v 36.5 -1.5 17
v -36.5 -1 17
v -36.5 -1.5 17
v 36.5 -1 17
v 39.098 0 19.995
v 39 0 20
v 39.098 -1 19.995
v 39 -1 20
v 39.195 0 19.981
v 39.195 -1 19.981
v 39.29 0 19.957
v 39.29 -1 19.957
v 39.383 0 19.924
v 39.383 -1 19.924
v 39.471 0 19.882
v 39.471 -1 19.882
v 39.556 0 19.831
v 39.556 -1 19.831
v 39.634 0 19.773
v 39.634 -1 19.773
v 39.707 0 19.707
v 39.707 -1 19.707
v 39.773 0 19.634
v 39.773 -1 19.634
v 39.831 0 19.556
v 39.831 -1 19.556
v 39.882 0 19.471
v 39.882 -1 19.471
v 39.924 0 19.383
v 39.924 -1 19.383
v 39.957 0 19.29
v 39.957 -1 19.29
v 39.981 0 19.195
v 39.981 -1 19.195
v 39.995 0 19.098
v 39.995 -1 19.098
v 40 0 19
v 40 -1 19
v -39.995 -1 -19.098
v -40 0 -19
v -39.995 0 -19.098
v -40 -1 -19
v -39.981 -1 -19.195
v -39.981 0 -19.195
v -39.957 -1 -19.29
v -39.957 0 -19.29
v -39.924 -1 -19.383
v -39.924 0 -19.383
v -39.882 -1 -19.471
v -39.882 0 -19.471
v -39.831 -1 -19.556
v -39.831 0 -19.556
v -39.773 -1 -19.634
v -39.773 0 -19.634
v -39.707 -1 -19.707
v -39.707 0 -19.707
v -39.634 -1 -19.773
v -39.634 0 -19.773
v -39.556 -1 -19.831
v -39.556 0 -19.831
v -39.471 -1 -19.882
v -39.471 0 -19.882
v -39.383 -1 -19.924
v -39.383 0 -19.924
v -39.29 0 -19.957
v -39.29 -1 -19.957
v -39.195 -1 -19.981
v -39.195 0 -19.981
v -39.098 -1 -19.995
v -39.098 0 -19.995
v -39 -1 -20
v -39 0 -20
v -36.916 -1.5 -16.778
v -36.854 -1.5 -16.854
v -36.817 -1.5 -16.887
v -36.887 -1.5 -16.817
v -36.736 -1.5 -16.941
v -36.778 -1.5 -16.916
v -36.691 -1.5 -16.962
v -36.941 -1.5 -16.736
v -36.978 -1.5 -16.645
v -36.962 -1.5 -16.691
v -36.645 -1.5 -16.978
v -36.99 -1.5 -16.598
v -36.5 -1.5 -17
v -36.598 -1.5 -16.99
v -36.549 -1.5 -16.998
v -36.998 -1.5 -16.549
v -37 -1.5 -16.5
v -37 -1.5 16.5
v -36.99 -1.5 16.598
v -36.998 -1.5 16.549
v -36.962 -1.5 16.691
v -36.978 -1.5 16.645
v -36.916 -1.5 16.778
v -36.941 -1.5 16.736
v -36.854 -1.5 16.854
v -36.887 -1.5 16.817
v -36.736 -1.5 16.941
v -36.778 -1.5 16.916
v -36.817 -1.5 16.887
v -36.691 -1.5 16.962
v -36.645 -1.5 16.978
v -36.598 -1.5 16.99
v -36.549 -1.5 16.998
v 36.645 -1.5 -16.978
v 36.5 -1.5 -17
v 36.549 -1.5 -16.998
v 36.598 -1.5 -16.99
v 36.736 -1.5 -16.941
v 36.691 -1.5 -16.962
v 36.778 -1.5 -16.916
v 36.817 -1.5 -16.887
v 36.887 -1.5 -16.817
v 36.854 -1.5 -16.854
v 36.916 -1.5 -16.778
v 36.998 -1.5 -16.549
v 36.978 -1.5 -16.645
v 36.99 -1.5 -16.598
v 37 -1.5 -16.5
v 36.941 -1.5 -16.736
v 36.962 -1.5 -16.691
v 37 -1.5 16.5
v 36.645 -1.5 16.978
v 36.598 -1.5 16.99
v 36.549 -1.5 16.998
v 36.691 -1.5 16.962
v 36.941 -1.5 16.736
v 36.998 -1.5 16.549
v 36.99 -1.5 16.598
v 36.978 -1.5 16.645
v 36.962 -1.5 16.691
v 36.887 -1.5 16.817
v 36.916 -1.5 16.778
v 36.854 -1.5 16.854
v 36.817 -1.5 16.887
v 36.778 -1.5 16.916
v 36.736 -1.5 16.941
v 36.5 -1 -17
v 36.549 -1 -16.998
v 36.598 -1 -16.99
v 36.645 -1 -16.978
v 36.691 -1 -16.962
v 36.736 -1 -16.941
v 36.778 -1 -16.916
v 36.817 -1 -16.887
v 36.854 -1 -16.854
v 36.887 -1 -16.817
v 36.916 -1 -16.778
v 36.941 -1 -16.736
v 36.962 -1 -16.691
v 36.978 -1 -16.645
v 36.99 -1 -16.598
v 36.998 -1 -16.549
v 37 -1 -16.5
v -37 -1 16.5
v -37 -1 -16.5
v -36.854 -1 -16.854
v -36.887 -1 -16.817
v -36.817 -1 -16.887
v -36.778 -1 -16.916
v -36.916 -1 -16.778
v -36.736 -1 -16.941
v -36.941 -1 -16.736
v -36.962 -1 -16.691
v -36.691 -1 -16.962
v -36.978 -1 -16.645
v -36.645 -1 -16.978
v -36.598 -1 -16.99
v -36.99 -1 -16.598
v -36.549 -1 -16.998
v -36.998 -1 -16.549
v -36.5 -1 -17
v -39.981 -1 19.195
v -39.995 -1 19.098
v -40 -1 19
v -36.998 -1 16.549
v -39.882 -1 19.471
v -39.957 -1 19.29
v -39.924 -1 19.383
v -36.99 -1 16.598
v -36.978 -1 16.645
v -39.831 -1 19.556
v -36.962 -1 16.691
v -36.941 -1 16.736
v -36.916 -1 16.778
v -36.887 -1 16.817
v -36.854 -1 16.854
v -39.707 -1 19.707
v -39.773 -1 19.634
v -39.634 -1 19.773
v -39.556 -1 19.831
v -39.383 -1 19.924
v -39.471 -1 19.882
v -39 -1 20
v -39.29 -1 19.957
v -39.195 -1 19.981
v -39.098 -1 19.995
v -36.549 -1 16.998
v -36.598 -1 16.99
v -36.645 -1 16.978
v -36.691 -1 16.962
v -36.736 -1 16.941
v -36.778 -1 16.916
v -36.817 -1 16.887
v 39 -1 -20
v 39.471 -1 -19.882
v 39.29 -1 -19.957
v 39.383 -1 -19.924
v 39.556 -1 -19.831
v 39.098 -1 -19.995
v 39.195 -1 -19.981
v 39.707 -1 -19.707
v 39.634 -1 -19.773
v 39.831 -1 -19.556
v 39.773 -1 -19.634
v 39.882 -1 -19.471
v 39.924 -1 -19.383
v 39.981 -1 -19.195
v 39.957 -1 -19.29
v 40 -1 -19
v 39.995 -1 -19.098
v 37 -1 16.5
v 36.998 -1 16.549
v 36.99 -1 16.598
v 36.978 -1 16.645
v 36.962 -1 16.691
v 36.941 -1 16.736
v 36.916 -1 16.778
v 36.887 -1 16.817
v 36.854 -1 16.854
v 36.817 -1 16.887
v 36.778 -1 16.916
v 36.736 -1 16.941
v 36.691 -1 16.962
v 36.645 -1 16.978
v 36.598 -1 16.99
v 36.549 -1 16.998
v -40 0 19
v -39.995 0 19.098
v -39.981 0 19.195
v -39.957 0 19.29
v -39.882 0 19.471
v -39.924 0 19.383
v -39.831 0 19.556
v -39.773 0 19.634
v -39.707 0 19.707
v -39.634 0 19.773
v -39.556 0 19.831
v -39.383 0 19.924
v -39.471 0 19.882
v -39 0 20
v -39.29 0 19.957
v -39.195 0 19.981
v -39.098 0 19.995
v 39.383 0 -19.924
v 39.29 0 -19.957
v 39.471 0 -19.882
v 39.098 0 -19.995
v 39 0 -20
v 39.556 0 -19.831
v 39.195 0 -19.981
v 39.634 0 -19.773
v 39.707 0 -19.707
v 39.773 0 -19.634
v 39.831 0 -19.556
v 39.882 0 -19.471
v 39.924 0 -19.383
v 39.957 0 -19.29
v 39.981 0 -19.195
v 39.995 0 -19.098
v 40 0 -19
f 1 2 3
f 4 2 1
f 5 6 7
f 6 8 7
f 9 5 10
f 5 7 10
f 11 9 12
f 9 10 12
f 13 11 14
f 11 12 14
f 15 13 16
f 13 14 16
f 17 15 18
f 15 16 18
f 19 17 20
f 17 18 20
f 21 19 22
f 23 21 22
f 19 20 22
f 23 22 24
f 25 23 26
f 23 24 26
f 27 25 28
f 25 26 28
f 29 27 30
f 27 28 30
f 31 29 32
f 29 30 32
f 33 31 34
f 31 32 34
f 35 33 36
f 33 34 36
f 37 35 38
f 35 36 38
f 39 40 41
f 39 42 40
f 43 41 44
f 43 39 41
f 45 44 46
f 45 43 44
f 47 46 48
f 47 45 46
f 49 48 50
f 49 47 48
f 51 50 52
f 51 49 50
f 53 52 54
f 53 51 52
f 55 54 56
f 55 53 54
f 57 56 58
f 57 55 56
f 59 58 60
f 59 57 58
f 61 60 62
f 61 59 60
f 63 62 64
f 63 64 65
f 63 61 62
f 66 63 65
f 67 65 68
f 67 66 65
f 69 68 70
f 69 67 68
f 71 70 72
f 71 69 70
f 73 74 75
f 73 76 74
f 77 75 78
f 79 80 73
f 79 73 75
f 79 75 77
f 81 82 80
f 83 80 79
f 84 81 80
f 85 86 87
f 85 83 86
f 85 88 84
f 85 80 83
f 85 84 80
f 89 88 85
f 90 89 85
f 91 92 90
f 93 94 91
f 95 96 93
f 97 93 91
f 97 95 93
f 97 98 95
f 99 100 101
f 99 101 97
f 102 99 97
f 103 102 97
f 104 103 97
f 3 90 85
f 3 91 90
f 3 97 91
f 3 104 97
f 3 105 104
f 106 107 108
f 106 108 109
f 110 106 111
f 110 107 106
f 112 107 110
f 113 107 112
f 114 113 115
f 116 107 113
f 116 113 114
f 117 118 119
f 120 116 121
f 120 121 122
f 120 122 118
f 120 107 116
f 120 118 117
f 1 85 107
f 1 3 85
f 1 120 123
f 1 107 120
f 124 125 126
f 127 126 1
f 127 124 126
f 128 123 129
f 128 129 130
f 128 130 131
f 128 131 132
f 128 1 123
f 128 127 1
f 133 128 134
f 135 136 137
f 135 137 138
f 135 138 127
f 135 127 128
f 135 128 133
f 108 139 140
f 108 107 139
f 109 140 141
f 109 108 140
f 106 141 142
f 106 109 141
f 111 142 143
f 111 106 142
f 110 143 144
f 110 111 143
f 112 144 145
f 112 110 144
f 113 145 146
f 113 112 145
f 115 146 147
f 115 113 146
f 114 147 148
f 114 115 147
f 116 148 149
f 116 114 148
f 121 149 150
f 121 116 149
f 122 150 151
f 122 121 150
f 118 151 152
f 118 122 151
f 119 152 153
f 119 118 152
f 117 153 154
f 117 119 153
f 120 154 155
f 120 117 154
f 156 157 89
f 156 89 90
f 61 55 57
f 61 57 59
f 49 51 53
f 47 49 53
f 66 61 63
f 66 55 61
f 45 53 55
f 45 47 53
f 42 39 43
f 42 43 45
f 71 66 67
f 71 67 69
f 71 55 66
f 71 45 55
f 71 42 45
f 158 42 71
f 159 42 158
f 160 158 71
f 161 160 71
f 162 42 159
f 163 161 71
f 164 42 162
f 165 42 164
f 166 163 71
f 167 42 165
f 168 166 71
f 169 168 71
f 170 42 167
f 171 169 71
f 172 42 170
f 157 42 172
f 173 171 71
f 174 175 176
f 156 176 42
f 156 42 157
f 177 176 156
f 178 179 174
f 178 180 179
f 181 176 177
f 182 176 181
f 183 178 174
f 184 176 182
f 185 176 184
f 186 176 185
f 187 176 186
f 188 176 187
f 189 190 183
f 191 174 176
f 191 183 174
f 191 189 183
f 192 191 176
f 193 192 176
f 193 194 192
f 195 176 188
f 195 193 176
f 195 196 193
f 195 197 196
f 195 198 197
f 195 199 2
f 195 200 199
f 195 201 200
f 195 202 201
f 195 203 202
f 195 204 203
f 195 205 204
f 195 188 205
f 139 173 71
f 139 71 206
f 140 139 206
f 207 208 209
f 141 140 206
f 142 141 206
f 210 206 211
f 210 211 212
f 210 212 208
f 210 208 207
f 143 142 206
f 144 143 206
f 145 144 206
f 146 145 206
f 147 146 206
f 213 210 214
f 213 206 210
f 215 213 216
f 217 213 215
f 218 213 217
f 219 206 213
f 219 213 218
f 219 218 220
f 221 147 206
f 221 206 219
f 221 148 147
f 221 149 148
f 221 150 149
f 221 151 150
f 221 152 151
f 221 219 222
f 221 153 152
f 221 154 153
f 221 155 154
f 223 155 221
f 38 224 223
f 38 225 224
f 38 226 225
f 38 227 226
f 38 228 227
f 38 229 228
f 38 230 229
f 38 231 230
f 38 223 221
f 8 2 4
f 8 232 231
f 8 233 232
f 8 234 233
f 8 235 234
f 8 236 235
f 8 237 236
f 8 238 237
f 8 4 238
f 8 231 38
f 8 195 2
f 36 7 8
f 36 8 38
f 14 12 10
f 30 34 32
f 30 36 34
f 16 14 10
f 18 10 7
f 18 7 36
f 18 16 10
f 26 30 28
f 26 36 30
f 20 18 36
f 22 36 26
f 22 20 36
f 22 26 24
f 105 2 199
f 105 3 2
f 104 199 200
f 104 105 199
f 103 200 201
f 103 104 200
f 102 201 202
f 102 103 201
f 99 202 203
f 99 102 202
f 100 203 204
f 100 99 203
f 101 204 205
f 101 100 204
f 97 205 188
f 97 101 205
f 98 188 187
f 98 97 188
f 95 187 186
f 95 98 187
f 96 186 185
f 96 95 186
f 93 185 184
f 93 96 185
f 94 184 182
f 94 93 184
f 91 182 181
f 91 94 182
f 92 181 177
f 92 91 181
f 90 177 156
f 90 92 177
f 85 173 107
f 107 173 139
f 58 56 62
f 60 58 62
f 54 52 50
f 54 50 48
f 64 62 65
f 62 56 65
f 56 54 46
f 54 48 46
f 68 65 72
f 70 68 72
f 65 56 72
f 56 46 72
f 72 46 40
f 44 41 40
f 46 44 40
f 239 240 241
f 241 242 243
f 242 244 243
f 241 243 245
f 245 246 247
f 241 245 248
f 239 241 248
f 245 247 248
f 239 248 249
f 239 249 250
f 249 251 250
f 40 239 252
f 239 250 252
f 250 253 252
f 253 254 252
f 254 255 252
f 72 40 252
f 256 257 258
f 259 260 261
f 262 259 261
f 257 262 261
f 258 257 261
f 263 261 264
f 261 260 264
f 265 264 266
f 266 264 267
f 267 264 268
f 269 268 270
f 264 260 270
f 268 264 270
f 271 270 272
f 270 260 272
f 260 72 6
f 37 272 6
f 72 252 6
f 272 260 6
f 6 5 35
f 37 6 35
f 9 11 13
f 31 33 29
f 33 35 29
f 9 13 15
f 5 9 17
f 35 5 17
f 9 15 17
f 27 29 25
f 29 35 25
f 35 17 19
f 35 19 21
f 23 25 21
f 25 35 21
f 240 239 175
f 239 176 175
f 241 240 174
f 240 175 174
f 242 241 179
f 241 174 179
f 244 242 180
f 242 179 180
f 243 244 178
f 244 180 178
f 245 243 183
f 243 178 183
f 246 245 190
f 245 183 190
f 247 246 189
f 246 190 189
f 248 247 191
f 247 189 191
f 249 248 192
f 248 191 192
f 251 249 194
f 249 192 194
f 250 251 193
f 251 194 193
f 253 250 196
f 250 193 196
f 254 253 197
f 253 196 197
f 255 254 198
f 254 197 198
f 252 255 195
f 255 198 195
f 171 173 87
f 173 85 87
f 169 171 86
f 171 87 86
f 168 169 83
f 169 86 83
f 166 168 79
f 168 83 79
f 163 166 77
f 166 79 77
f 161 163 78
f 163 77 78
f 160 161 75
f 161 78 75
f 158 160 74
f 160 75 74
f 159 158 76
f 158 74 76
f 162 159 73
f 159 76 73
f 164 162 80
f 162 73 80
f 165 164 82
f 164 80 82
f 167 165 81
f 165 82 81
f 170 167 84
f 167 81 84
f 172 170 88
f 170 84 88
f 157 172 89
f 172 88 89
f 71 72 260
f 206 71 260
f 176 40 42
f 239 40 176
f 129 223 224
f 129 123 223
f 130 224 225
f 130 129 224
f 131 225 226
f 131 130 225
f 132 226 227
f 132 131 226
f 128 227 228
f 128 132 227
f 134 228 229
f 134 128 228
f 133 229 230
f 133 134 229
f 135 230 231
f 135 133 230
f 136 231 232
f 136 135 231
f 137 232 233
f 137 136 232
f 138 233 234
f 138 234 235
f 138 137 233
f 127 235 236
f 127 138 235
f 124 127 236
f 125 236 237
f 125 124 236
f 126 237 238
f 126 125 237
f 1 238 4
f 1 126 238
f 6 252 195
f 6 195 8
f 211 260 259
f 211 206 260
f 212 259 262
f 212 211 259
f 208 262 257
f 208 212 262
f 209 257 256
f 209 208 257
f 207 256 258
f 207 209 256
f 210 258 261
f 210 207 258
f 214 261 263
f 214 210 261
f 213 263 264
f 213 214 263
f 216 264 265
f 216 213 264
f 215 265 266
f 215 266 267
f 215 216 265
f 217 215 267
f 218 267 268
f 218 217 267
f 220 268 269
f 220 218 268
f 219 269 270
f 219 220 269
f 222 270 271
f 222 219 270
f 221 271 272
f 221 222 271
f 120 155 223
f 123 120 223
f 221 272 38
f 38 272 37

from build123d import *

# Parameters (mm, degrees)
F0_W     = 80
F0_H     = 40
F1_DEPTH = 1
F2_W     = 74
F2_H     = 34
F3_DEPTH = 0.5
F4_R     = 1
F5_R     = 0.5


with BuildPart() as f1:
    # F0 (on Front) → F1 (new body)
    with BuildSketch(Plane.XZ):
        Rectangle(F0_W, F0_H)
    extrude(amount=F1_DEPTH)

    # F2 (on face) → F3 (join)
    with BuildSketch(Plane.XZ.offset(1)):
        Rectangle(F2_W, F2_H)
    extrude(amount=F3_DEPTH)

    # F4
    f4_edges = [f1.edges().sort_by_distance(p)[0] for p in [
        (40, -0.5, 20),
        (40, -0.5, -20),
        (-40, -0.5, -20),
        (-40, -0.5, 20),
    ]]
    fillet(f4_edges, radius=F4_R)

    # F5
    f5_edges = [f1.edges().sort_by_distance(p)[0] for p in [
        (-37, -1.25, 17),
        (-37, -1.25, -17),
        (37, -1.25, -17),
        (37, -1.25, 17),
    ]]
    fillet(f5_edges, radius=F5_R)


solid = f1.part
